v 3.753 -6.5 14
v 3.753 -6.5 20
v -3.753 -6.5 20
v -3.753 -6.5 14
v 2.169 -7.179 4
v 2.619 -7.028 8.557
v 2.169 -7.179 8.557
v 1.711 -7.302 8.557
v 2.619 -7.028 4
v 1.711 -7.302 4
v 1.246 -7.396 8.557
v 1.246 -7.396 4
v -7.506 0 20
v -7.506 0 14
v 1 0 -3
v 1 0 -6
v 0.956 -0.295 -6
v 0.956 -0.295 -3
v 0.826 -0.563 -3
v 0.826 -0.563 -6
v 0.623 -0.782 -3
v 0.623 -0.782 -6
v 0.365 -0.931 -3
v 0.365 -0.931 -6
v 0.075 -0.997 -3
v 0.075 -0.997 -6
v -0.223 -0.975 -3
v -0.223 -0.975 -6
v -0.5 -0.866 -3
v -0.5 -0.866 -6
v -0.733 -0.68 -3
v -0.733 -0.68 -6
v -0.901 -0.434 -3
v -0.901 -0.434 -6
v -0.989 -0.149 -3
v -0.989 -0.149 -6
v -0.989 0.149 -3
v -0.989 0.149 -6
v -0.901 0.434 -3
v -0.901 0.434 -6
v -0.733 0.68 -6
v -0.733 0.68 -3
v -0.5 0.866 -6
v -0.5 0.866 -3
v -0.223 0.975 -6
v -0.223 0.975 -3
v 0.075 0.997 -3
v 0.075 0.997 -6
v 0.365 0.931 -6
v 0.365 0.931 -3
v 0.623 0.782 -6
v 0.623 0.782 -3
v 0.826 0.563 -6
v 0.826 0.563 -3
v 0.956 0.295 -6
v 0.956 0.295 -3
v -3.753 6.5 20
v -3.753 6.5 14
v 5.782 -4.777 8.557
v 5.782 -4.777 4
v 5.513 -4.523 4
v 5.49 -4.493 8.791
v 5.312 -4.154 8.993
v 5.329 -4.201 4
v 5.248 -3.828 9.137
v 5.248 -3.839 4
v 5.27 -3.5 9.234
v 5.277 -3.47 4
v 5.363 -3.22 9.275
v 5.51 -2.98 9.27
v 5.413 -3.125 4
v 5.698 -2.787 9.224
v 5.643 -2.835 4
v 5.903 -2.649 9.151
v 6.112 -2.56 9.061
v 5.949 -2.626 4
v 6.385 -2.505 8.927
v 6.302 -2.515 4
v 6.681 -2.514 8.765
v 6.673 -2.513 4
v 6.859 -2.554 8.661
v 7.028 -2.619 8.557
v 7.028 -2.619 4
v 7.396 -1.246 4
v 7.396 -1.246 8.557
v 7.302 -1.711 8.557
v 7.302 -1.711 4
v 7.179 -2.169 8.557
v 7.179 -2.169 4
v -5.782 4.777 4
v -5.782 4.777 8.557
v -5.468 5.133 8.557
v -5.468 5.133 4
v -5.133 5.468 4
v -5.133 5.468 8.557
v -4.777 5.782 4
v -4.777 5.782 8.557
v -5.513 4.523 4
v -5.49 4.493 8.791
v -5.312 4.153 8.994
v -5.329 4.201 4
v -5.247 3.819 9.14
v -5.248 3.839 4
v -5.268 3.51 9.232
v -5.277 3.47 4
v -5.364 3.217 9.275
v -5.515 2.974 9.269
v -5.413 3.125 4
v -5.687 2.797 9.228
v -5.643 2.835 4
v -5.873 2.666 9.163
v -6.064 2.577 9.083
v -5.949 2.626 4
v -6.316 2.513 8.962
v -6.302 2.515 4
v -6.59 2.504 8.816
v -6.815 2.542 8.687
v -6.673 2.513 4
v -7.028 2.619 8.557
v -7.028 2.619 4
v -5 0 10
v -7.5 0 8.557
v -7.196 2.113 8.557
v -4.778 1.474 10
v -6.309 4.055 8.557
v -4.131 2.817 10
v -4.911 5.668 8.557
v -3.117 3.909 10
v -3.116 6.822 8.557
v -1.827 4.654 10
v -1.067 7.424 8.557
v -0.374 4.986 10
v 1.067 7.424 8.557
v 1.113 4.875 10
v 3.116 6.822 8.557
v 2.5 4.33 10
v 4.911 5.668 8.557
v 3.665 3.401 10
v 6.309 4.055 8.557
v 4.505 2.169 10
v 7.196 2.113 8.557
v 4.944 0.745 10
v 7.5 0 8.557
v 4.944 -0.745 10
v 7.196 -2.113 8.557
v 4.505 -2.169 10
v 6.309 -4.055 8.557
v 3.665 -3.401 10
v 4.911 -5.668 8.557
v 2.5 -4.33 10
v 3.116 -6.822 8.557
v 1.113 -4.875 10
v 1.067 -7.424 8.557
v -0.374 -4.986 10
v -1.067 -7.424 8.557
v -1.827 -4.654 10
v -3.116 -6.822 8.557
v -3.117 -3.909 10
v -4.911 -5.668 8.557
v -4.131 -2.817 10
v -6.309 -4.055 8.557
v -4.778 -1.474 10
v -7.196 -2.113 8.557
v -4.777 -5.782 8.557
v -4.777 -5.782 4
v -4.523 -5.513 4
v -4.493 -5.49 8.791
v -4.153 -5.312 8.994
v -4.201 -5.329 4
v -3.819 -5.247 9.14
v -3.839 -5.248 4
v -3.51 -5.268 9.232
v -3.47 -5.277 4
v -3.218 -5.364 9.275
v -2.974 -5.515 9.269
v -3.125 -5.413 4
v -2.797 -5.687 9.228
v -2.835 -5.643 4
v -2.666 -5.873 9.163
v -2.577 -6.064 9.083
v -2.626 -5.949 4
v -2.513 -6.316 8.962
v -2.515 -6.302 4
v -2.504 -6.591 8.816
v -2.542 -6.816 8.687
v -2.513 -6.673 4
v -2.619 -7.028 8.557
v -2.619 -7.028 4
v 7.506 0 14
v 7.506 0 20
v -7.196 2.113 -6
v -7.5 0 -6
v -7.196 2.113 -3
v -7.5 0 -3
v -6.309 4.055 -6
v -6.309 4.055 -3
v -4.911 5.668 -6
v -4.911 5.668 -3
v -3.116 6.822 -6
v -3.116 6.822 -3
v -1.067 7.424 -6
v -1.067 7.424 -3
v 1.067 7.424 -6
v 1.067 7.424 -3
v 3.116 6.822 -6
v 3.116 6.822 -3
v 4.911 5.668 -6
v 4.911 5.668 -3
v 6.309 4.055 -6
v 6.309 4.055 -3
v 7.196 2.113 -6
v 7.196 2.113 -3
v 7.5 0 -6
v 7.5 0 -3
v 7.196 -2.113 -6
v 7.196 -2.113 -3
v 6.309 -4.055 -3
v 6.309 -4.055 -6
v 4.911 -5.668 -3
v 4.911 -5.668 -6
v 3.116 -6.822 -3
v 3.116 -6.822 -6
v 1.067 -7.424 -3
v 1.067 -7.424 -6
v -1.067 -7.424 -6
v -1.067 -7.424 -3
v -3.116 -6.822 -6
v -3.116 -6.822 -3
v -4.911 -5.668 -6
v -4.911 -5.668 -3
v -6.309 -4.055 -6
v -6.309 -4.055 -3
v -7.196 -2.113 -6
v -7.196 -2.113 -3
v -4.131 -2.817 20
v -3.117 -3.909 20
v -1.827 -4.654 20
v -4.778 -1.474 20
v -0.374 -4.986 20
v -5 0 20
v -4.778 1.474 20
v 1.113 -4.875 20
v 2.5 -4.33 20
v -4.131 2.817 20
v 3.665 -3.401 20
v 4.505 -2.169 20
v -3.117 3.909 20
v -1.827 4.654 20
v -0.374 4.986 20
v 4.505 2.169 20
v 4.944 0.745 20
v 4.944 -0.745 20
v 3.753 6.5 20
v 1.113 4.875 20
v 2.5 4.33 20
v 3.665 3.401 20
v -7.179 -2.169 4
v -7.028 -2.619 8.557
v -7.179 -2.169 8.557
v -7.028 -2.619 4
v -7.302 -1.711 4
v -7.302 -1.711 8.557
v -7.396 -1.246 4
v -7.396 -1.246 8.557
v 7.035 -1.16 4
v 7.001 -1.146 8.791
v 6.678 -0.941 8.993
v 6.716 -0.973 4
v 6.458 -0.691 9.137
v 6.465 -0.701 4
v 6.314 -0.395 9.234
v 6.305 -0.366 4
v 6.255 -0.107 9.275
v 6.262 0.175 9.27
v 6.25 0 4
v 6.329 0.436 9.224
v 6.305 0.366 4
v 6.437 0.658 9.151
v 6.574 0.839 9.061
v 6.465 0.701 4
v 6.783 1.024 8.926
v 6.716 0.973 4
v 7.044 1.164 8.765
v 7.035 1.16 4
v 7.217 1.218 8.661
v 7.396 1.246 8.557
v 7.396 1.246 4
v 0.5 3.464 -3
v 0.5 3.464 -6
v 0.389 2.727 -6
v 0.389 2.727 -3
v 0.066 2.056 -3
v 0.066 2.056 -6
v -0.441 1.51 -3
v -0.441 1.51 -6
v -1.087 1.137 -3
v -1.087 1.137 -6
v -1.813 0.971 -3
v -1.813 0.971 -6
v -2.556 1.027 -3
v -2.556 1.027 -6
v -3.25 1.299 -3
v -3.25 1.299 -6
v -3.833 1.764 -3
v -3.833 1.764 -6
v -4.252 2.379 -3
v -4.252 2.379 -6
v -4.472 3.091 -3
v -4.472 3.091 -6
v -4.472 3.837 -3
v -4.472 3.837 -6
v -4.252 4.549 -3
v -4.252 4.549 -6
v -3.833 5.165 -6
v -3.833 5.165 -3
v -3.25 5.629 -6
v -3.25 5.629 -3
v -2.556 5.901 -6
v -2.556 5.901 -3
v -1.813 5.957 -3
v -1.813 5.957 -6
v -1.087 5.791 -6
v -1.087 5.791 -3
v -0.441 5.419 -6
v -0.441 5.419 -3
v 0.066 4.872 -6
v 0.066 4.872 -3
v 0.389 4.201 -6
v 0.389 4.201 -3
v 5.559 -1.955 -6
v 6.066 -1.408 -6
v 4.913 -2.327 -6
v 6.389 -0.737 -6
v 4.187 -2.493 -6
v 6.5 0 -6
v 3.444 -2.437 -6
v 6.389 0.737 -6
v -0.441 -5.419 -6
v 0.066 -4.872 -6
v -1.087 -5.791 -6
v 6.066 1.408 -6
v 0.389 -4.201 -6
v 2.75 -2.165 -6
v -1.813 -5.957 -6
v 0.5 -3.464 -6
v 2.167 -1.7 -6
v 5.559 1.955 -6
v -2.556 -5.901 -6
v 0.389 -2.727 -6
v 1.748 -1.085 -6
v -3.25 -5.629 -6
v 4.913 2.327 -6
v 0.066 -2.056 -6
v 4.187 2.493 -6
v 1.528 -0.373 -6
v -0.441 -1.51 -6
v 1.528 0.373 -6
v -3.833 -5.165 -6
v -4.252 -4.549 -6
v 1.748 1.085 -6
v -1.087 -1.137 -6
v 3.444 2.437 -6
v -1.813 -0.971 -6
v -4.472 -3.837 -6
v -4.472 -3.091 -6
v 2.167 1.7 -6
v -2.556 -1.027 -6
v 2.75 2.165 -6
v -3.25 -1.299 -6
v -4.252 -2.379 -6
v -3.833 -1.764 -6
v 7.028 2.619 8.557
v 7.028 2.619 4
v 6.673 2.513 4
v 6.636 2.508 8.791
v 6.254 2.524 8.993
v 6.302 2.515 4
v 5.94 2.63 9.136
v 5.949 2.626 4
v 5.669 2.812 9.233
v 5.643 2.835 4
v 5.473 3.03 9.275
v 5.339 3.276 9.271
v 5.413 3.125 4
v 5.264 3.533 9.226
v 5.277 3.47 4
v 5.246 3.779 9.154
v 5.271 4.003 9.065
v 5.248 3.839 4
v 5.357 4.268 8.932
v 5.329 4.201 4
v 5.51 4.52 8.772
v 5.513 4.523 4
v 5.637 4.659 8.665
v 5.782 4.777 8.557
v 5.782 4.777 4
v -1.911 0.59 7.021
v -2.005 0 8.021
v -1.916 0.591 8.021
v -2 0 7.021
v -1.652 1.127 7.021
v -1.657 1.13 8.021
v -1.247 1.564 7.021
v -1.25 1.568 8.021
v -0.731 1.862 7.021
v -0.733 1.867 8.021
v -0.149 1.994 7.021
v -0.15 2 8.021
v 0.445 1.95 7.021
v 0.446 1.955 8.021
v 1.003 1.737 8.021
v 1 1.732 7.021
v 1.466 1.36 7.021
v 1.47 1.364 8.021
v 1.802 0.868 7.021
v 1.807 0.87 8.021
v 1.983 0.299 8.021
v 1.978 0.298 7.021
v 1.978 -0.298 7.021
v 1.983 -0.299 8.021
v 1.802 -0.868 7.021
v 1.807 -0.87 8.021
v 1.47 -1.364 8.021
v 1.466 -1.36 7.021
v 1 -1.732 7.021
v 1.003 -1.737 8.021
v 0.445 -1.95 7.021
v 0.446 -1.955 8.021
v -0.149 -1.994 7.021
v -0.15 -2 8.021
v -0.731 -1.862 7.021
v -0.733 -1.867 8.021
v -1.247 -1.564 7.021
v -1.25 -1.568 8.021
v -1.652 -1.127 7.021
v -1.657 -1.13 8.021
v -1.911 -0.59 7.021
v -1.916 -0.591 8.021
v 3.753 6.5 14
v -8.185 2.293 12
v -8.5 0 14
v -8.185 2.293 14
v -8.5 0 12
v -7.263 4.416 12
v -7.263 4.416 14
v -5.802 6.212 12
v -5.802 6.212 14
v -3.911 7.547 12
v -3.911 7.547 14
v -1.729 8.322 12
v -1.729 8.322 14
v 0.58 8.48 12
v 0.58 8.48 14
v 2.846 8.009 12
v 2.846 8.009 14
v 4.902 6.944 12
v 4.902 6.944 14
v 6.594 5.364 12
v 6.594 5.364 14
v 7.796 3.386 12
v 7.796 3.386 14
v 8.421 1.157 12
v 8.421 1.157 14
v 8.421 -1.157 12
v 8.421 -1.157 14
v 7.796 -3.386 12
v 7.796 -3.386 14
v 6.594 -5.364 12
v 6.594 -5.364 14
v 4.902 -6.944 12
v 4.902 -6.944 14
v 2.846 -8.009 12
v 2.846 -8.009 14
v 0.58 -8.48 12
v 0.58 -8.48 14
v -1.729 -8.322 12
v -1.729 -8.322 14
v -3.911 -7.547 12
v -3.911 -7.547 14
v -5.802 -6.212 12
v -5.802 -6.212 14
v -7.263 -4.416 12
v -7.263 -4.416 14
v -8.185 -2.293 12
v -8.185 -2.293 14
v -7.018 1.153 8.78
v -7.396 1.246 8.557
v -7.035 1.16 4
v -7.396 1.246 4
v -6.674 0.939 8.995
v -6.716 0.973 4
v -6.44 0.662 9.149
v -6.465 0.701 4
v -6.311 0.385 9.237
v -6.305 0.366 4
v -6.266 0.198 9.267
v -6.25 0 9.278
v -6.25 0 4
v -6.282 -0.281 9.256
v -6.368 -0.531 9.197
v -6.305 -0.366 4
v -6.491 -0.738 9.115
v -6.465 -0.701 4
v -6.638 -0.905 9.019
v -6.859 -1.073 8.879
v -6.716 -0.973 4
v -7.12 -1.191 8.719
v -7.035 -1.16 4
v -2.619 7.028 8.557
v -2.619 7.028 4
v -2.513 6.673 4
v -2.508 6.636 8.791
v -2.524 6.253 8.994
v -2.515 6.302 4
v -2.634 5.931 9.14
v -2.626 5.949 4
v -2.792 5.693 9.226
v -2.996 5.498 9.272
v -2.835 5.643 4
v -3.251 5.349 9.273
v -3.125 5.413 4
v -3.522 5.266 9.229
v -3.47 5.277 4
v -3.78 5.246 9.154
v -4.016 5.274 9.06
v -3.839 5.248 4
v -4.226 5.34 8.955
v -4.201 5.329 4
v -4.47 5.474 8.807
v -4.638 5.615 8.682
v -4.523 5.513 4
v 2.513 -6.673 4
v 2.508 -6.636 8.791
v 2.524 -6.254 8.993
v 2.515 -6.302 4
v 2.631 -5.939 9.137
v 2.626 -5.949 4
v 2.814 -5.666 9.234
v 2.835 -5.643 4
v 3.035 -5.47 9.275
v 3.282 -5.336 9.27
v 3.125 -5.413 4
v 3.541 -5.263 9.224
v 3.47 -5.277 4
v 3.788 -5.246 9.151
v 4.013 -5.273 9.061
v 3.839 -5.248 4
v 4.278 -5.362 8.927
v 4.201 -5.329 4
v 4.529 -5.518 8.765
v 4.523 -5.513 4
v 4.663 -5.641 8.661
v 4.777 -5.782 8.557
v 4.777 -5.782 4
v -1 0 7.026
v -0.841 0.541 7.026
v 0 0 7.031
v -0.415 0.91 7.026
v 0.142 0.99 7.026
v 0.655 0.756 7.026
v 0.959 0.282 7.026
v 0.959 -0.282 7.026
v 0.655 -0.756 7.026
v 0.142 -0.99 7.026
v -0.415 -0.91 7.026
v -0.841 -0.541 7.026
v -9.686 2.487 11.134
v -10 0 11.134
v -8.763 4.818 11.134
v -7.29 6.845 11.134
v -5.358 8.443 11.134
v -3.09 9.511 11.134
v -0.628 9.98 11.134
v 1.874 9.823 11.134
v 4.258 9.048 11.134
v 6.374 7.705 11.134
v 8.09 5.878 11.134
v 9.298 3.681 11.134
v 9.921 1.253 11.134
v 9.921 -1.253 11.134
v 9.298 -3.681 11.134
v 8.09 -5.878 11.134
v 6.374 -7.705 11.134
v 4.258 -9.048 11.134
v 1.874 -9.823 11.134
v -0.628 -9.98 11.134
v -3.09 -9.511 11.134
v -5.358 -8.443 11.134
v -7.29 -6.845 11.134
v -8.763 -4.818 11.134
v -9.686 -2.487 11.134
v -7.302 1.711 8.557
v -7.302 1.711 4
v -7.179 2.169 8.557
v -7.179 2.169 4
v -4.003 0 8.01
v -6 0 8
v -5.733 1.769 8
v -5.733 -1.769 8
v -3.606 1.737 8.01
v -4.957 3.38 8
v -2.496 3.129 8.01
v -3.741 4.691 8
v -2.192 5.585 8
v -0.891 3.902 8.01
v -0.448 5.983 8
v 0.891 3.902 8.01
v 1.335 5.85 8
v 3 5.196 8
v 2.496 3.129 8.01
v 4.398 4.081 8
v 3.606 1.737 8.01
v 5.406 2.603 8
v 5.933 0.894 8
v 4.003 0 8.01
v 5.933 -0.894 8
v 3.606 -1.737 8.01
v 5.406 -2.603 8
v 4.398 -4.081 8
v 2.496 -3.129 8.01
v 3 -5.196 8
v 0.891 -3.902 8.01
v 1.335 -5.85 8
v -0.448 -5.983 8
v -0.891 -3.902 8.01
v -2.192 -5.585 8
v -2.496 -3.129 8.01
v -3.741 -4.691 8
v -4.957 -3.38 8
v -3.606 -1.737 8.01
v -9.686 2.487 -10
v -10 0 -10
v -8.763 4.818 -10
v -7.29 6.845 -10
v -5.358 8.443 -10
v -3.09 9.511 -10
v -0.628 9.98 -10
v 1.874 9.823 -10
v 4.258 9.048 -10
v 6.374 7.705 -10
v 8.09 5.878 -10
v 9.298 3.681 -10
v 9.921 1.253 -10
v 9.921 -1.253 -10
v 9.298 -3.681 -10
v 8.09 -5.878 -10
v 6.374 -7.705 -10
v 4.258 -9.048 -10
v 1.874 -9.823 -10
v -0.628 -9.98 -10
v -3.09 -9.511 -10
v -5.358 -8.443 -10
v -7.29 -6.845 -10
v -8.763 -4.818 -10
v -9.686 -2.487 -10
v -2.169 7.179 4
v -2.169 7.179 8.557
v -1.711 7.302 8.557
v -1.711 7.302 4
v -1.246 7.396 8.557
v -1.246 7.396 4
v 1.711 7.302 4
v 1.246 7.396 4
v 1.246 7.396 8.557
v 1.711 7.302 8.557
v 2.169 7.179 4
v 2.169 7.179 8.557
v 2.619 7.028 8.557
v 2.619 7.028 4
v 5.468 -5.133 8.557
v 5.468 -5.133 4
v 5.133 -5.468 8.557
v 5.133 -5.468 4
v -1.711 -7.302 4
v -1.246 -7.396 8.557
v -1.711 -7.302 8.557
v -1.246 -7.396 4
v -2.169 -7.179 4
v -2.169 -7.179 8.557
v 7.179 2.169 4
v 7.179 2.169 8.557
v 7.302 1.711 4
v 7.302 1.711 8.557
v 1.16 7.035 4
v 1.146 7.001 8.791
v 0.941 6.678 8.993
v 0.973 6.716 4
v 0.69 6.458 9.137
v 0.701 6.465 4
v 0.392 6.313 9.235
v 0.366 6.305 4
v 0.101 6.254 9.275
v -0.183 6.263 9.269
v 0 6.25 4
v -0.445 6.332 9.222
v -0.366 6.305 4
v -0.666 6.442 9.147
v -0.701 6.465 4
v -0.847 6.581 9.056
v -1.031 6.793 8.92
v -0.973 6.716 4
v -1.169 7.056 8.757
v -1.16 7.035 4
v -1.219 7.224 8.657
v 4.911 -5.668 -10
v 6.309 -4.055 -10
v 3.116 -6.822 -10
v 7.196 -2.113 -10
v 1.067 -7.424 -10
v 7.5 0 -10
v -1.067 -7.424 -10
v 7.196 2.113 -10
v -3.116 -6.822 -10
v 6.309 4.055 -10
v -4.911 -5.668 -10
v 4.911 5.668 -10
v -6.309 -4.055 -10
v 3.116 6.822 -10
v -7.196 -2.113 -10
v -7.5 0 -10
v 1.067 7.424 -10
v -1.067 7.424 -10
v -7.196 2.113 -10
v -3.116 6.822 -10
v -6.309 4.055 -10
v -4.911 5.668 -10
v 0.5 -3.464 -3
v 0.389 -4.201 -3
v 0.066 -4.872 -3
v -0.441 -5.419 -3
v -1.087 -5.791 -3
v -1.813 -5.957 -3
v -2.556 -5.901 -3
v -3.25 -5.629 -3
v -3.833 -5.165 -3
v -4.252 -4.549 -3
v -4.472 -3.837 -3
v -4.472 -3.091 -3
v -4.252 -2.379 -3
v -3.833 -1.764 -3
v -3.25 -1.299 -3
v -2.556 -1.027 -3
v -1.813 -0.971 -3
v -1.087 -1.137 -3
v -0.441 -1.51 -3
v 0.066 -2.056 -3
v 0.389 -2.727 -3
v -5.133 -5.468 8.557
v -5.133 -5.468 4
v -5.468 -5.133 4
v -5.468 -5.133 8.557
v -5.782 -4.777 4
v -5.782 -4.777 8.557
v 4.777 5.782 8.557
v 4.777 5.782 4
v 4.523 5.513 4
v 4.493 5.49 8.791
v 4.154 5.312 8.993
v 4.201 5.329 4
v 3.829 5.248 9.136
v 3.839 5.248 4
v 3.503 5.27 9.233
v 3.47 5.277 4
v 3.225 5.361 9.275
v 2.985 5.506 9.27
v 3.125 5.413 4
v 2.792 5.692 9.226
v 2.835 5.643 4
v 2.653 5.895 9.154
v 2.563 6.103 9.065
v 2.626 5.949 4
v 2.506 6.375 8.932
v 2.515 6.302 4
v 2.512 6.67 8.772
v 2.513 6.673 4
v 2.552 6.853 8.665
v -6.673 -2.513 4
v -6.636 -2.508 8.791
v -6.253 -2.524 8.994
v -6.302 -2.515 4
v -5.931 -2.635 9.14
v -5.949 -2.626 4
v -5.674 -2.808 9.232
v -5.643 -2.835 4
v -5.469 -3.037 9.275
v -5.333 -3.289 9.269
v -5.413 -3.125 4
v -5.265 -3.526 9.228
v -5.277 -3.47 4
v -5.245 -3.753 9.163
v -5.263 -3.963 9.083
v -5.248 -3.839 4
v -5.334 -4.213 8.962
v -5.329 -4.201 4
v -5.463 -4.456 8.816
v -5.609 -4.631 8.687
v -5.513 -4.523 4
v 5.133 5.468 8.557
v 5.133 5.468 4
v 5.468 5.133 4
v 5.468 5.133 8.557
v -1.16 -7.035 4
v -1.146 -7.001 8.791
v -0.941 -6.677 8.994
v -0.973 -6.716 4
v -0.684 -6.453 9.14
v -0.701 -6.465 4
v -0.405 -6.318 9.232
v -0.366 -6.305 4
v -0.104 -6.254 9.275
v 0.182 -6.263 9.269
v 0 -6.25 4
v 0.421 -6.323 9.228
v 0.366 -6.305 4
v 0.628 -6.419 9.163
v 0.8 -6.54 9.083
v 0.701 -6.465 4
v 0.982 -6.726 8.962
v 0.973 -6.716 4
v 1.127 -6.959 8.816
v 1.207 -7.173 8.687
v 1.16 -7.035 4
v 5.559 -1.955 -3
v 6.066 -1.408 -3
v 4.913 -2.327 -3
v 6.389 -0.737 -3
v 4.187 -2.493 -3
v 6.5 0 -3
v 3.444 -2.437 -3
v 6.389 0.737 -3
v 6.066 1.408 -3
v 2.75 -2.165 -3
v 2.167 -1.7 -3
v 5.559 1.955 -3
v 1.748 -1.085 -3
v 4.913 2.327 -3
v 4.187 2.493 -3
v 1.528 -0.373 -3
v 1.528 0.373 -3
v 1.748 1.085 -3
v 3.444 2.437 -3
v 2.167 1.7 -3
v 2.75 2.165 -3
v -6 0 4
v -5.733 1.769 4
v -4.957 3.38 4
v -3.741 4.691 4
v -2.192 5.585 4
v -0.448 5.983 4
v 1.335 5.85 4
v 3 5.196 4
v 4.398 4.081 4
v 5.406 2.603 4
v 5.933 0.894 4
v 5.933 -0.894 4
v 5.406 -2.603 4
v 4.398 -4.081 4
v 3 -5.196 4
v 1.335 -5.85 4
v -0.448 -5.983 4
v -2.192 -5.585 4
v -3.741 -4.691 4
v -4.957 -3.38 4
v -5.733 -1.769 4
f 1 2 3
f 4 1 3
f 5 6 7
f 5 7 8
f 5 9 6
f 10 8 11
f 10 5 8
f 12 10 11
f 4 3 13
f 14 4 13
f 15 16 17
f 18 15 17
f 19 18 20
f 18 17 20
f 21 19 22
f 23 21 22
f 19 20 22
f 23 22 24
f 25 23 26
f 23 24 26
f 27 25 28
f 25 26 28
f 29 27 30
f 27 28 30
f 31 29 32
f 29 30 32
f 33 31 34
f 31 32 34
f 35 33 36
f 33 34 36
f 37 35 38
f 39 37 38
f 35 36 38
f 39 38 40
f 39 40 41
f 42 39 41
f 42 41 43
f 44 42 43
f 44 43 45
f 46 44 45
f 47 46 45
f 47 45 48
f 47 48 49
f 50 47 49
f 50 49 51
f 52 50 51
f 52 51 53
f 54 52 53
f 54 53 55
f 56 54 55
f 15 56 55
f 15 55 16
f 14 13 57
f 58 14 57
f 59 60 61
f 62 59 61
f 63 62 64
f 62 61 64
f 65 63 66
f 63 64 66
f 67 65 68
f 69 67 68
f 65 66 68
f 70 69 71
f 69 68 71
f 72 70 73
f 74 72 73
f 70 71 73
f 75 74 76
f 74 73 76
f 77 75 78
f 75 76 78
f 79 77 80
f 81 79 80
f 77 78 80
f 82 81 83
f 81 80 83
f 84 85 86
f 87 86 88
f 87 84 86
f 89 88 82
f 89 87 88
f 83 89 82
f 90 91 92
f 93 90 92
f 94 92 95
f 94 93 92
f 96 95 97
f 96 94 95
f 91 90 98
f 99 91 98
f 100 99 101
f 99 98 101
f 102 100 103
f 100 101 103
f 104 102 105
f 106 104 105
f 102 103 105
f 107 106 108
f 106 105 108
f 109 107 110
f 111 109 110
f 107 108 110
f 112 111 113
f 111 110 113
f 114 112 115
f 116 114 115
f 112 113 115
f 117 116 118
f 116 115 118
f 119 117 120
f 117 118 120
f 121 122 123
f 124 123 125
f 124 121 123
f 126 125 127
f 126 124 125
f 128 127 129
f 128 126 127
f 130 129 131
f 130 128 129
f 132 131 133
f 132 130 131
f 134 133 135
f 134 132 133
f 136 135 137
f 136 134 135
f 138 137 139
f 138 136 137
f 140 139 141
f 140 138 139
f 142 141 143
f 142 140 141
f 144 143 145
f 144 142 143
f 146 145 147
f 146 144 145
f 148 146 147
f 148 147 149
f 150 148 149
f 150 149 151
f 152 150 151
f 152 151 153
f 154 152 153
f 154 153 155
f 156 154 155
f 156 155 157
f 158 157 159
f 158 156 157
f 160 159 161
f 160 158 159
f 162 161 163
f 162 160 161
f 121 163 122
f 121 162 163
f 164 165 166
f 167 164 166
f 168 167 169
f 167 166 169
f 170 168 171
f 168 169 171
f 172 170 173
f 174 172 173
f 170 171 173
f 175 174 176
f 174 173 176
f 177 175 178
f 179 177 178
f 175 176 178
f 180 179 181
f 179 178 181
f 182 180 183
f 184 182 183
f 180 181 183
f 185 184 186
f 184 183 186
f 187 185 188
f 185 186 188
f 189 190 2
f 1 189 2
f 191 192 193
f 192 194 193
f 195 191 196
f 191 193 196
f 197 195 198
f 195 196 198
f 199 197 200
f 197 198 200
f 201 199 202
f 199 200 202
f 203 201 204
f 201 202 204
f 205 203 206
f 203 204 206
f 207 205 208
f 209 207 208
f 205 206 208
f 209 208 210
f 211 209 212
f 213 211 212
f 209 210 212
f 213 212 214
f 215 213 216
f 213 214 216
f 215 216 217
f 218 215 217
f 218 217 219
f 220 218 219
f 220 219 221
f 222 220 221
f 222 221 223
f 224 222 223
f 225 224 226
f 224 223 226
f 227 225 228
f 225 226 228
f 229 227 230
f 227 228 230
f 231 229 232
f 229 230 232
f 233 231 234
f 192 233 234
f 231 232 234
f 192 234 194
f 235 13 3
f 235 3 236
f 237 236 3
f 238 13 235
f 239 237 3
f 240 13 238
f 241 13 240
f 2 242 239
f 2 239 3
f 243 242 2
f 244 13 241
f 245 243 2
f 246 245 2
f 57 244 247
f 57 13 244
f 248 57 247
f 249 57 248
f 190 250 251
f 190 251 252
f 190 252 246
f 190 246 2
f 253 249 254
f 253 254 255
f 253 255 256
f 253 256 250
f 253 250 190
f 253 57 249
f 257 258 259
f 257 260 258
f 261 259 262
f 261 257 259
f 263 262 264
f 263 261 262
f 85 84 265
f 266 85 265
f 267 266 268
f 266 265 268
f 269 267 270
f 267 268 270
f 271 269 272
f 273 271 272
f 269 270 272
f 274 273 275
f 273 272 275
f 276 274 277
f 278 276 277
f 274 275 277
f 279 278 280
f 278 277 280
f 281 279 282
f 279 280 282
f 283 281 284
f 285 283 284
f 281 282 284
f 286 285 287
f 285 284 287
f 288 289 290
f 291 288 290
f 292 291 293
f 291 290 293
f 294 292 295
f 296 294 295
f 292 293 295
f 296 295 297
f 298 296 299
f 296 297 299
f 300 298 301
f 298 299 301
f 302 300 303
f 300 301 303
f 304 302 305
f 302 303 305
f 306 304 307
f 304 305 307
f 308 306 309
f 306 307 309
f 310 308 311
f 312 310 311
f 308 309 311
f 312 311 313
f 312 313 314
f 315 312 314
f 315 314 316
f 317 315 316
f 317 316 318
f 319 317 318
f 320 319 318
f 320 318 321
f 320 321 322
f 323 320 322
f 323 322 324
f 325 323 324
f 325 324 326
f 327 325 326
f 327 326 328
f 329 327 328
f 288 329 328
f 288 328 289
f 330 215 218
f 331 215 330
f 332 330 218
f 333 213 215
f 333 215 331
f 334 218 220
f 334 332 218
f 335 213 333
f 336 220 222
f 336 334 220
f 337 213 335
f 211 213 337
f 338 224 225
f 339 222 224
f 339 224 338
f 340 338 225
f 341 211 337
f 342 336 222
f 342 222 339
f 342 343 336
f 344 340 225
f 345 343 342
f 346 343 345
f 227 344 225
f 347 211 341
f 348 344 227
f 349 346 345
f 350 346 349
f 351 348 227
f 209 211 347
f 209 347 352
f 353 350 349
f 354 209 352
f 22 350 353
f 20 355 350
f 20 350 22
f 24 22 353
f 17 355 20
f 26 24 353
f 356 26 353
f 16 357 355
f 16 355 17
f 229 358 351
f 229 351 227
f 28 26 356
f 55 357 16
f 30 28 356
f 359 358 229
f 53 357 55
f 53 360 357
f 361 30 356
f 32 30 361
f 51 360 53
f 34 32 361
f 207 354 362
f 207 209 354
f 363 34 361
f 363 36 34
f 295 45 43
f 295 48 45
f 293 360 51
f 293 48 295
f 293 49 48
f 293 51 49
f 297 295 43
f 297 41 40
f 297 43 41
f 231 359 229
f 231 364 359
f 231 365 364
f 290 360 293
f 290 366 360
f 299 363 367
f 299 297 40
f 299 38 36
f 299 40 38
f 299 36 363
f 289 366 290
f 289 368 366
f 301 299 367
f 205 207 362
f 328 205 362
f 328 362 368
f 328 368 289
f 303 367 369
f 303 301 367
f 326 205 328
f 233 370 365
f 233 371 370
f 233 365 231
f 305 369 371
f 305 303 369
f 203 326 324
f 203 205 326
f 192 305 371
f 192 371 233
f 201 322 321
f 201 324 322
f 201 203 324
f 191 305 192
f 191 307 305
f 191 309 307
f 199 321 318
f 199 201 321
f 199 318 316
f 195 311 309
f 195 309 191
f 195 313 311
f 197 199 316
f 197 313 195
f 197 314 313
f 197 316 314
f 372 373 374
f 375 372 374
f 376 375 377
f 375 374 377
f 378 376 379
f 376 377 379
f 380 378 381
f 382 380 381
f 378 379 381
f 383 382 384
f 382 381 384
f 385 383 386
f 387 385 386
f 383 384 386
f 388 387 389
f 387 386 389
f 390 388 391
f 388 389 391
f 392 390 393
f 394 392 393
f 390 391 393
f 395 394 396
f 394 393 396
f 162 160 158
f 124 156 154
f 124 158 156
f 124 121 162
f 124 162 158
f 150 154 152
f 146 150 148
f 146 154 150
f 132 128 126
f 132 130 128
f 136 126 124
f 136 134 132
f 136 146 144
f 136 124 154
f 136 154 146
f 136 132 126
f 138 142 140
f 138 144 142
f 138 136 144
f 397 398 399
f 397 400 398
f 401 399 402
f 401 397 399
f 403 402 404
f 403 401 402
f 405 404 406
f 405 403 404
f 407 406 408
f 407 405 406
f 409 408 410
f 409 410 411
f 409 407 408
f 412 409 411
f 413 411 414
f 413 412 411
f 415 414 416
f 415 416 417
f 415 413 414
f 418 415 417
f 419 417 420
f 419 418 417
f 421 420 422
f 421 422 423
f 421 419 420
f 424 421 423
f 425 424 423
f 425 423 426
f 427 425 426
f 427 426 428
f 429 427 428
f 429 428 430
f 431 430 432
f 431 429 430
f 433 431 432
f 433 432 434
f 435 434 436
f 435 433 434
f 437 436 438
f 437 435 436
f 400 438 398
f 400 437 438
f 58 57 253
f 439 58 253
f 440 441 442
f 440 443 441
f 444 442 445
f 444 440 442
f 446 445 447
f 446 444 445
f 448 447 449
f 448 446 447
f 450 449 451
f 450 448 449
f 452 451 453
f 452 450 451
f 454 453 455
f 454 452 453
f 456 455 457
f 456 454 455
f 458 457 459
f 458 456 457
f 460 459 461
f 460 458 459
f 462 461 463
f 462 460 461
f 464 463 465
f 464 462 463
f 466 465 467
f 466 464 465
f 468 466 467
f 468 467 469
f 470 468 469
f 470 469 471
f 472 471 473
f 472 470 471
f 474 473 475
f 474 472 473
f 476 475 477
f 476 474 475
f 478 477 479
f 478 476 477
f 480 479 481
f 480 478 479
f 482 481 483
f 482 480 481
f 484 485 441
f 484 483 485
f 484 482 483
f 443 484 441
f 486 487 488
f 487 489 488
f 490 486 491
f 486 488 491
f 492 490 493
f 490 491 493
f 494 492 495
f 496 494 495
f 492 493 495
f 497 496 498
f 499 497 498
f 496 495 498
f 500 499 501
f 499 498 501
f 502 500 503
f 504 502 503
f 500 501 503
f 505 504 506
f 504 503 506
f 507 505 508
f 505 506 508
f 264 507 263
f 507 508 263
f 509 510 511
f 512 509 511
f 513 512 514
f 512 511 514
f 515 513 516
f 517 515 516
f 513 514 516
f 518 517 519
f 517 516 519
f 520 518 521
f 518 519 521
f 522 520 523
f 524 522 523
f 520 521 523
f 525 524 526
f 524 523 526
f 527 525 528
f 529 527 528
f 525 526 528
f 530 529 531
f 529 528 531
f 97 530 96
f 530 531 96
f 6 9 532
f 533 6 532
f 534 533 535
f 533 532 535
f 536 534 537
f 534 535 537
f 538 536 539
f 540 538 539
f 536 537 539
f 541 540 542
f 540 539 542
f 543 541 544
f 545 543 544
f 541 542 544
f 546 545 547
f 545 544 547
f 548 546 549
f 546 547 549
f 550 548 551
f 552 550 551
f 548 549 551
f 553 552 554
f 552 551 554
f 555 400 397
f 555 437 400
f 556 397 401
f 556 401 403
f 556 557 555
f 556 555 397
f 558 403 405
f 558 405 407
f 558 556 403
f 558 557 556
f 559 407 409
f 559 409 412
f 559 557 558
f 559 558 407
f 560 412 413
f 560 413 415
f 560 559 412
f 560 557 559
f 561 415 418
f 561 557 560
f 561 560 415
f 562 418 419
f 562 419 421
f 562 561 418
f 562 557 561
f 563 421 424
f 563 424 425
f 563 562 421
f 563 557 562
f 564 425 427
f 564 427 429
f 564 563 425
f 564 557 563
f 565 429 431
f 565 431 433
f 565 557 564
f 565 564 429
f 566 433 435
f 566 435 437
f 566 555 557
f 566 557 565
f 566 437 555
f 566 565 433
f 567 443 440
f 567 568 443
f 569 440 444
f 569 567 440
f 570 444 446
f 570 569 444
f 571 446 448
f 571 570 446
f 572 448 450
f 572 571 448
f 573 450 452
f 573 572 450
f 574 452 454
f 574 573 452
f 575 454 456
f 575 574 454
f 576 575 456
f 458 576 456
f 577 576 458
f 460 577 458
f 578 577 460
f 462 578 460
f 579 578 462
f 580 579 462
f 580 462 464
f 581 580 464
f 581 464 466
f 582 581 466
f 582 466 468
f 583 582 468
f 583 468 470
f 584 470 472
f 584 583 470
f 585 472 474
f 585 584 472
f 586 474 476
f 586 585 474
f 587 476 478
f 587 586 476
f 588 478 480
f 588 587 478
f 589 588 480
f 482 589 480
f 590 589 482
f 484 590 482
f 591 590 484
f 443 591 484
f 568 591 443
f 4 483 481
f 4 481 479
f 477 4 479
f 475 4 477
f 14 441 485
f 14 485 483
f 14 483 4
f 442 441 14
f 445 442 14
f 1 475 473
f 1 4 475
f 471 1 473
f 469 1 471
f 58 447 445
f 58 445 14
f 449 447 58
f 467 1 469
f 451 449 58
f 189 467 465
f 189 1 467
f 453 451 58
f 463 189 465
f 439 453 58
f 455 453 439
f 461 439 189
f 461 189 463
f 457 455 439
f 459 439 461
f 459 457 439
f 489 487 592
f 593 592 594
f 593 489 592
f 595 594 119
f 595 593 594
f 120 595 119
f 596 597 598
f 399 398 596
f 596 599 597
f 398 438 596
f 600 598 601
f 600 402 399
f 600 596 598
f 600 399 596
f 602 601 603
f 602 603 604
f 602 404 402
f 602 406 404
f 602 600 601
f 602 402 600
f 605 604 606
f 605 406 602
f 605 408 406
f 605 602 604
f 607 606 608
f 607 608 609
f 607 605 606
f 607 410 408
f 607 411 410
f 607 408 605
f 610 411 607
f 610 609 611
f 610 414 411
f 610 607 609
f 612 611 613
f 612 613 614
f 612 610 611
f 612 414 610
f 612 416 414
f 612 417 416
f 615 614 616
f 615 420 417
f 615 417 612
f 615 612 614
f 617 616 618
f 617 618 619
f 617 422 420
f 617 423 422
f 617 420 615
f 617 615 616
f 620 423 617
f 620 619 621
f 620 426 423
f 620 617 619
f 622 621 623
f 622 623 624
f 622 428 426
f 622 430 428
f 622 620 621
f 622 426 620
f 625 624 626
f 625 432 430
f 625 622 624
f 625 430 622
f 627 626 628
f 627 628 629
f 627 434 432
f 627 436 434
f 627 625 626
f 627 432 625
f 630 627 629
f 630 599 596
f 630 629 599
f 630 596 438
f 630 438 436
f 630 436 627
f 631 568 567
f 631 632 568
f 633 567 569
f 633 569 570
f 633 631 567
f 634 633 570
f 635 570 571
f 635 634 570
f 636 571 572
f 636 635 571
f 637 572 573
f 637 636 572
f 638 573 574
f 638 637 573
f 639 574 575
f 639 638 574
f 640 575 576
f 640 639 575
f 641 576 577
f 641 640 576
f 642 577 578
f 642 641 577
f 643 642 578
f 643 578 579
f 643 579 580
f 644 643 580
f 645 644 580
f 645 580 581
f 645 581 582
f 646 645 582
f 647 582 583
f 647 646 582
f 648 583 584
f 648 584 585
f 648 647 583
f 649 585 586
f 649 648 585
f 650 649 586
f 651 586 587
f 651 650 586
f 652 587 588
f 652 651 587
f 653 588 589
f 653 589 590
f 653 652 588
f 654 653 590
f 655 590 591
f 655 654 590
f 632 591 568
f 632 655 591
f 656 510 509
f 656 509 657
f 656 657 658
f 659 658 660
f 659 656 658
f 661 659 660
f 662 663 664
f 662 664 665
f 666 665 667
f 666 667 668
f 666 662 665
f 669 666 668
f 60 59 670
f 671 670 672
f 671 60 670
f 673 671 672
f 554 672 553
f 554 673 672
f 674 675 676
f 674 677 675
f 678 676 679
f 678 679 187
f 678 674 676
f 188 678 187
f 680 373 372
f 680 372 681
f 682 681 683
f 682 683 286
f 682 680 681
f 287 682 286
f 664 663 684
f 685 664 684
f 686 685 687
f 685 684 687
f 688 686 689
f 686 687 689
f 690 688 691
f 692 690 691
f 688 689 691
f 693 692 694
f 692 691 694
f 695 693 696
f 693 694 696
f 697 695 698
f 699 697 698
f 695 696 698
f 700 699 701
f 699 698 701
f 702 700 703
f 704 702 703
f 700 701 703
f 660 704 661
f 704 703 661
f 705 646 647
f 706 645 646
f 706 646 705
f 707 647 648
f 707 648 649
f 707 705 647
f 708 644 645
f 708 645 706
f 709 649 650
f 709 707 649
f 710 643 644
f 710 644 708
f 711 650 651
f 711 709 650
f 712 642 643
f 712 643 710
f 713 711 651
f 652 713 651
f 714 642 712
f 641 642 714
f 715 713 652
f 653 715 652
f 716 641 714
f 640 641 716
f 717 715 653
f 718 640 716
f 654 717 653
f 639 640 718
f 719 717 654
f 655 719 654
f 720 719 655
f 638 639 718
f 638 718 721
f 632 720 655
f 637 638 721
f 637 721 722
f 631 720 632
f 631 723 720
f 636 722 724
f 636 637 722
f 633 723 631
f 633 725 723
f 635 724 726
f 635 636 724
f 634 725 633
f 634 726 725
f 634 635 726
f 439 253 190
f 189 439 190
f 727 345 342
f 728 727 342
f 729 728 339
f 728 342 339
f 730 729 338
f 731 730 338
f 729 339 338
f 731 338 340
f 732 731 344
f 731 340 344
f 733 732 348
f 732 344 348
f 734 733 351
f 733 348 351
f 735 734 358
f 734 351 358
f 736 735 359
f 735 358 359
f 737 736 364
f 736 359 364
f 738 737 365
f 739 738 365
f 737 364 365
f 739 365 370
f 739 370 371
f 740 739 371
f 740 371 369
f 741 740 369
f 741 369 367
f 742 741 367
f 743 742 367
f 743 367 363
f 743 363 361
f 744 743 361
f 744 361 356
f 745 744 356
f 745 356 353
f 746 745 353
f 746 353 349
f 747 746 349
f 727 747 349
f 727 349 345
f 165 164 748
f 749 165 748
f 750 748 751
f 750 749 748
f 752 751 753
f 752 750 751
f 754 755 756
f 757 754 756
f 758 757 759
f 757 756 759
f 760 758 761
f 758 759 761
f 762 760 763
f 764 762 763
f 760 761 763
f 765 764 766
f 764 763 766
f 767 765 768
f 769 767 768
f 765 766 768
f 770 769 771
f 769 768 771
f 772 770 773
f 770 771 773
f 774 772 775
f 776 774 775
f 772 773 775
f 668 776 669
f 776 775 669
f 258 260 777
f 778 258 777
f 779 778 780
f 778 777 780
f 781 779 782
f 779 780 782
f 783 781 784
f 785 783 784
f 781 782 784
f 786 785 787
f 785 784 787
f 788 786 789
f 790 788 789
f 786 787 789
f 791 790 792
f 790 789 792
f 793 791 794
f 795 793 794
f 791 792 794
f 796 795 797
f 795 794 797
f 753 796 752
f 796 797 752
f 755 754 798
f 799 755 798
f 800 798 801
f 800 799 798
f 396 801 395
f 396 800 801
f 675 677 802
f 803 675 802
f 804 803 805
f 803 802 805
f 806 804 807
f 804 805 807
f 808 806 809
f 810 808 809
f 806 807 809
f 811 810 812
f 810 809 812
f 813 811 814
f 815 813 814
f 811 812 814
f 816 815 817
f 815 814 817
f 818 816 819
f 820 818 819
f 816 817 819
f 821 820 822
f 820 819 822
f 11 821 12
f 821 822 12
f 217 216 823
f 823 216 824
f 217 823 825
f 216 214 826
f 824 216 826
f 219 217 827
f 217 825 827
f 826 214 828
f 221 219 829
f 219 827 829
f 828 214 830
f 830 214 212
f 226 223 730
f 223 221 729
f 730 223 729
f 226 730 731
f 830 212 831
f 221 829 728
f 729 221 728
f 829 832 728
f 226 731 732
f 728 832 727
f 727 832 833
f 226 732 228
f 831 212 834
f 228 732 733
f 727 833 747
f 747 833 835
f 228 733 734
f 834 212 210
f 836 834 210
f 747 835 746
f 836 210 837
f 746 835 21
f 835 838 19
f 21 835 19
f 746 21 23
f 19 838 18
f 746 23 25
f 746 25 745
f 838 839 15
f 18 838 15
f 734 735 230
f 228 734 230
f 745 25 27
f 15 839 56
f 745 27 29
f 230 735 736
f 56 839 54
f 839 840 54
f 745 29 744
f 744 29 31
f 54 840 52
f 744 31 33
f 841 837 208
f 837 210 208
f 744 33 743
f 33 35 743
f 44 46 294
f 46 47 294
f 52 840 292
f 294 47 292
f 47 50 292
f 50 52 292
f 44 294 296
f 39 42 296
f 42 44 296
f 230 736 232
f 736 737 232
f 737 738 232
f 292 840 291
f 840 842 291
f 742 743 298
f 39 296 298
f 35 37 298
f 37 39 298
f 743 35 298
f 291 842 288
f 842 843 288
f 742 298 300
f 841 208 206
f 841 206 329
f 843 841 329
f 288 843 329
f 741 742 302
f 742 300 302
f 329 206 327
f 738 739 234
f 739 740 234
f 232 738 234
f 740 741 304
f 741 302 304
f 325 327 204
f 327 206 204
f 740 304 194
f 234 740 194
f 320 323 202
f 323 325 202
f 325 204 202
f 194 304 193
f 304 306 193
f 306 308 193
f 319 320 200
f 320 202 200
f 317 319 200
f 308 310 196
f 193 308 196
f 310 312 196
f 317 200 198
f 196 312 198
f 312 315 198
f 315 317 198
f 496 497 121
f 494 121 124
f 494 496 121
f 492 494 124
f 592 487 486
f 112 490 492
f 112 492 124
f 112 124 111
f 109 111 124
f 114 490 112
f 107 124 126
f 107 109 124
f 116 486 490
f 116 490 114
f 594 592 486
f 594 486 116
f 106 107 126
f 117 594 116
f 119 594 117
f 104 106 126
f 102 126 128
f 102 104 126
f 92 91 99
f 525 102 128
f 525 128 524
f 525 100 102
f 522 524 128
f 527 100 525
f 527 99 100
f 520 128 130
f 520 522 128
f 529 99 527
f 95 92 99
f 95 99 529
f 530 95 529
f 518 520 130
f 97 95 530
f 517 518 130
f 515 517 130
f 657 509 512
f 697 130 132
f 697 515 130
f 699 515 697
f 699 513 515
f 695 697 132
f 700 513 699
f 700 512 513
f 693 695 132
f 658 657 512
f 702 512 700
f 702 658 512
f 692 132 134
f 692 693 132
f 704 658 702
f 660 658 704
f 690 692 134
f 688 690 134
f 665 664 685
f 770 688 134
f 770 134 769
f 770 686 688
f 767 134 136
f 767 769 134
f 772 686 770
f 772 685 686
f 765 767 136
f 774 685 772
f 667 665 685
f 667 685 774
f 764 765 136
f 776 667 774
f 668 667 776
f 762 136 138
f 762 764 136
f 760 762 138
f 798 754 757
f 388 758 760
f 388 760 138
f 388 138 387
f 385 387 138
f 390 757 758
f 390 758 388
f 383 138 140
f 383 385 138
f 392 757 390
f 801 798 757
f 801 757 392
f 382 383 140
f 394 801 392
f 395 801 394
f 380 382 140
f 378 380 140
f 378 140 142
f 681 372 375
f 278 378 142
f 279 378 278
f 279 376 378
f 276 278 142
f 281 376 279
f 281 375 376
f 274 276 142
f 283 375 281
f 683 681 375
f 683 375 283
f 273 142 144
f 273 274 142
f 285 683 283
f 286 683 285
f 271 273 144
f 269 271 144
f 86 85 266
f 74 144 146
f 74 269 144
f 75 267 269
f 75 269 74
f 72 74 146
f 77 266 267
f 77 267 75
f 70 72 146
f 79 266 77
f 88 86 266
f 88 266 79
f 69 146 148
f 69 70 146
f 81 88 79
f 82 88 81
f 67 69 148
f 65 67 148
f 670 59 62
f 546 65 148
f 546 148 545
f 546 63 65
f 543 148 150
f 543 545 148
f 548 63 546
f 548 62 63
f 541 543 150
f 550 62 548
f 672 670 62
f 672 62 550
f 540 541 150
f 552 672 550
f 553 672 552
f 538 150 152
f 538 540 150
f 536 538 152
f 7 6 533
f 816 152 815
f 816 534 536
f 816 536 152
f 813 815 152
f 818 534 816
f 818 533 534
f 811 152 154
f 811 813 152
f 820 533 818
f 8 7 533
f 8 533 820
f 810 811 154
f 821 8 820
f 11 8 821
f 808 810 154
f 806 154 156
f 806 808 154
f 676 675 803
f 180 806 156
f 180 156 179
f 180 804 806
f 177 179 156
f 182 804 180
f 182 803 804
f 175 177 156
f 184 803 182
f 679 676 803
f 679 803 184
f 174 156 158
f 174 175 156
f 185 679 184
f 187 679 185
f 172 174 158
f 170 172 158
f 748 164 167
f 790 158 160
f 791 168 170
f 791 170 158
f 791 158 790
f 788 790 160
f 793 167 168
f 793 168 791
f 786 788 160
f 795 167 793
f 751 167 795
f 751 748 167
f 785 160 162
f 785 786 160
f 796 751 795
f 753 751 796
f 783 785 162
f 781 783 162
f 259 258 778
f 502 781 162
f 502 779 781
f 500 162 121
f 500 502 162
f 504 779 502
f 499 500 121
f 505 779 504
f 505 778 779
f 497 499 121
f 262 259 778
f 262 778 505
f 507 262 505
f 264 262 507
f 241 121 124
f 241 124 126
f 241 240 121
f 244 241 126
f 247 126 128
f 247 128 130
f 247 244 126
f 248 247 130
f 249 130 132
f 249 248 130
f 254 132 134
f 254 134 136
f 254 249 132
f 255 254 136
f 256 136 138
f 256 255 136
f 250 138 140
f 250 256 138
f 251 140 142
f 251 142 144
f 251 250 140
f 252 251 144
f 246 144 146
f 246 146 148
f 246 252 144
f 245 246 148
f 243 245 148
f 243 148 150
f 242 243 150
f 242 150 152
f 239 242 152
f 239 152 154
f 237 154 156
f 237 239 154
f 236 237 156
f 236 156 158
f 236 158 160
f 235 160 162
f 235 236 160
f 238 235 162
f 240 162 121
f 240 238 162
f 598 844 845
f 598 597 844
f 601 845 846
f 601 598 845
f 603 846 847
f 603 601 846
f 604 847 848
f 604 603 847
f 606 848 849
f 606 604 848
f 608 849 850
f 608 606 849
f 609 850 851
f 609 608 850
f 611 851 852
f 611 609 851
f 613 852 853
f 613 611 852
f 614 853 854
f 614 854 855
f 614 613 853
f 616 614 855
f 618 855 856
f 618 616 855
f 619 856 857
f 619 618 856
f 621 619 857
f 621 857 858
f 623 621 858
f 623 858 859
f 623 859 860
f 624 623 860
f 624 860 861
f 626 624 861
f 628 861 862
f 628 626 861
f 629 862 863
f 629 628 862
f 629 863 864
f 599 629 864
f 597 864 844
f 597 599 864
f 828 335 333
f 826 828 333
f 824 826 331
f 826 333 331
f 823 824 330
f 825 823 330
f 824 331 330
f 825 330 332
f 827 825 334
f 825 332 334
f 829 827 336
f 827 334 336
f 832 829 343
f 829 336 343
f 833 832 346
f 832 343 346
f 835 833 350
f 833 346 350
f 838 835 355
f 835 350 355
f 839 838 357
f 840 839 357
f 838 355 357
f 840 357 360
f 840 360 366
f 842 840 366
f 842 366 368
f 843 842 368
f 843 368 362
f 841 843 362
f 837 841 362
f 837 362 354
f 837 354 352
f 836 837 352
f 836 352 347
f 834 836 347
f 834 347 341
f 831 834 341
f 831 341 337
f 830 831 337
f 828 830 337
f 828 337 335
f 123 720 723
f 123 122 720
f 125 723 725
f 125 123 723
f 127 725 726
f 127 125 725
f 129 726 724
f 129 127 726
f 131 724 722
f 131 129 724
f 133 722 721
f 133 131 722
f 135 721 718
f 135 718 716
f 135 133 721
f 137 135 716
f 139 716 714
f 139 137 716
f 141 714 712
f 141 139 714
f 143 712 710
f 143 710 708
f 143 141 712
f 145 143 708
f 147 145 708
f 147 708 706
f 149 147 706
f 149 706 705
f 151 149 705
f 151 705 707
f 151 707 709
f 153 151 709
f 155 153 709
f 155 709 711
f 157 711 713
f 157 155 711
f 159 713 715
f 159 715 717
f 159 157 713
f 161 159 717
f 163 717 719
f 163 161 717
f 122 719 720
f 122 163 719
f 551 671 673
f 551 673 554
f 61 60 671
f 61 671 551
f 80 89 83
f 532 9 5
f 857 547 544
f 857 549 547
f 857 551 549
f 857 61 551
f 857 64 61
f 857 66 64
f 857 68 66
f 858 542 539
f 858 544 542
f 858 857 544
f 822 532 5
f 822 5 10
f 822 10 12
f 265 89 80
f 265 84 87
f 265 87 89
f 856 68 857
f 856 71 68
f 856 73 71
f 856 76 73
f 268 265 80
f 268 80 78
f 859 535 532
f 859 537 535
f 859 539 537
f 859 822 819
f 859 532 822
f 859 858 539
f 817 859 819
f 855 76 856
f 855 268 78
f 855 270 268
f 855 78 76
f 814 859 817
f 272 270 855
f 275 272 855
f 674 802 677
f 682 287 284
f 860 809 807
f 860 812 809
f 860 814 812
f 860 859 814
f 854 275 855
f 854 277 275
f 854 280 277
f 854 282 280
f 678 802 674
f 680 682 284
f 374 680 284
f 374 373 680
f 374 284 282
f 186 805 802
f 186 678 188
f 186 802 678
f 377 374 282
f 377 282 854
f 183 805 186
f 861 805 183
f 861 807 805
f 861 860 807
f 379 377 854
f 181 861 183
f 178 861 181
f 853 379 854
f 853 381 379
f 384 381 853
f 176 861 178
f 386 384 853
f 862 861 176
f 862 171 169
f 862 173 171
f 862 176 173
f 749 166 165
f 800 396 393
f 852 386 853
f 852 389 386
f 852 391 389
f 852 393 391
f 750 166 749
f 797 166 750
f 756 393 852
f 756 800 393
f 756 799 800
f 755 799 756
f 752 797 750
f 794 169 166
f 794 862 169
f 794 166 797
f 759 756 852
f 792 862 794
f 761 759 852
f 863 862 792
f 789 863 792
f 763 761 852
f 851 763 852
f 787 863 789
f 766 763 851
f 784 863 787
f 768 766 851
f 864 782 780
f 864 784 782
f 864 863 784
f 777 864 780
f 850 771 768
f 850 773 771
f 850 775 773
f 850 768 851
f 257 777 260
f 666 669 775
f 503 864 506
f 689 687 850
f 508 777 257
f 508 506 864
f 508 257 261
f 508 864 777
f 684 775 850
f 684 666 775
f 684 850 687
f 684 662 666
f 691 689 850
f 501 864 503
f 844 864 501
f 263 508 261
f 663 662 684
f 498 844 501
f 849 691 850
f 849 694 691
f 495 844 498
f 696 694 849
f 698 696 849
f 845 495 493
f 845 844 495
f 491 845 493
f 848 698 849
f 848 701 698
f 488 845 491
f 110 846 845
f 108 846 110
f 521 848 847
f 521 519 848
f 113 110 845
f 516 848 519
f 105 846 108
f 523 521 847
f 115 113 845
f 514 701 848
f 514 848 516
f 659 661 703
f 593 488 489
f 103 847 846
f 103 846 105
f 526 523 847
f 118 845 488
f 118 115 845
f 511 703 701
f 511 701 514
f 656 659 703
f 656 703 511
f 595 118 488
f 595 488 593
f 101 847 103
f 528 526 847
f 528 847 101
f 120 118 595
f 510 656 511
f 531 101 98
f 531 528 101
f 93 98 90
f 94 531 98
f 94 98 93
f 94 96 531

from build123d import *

# Parameters (mm, degrees)
F0_W     = 7.5
F0_H     = 3
F4_R     = 2.5
F4_R_2   = 1
F5_DEPTH = 26.001
F6_R     = 1.25
F7_DEPTH = 8
F8_R     = 8.5
F9_DEPTH = 6


with BuildPart() as f1:
    # F0 (on Front) → F1 (revolve)
    with BuildSketch(Plane.XZ):
        Polygon((-5, 10), (-5, 20), (-8.5, 20), (-8.5, 12), (-10, 11.1339745962), (-10, -10), (-7.5, -10), (-7.5, -6), (-7.5, -3), (-7.5, 4), (-7.5, 8.556624327), align=None)
    revolve(axis=Axis((0, 0, 5.3995972465), (0, 0, -1)))

    # F8 (on face) → F9 (cut)
    with BuildSketch(Plane.XY.offset(20)):
        Circle(F8_R)
        Polygon((-3.7527767497, -6.5), (-7.5055534995, 0), (-3.7527767497, 6.5), (3.7527767497, 6.5), (7.5055534995, 0), (3.7527767497, -6.5), align=None, mode=Mode.SUBTRACT)
    extrude(amount=-F9_DEPTH, mode=Mode.SUBTRACT)


with BuildPart() as f2:
    # F0 (on Front) → F2 (revolve)
    with BuildSketch(Plane.XZ):
        Polygon((0, 10), (-5, 10), (-7.5, 8.556624327), (-7.5, 4), (-6, 4), (-6, 8), (-2.0052228626, 8.0208644567), (-2, 7.0208780959), (0, 7.0313239636), (0, 8.031337603), align=None)
    revolve(axis=Axis((0, 0, 5.3995972465), (0, 0, -1)))

    # F6 (on face) → F7 (cut)
    with BuildSketch(Plane(origin=(0, 0, 4), x_dir=(1, 0, 0), z_dir=(0, 0, -1))):
        with Locations((0, 7.5)):
            Circle(F6_R)
        with Locations((-3.75, 6.4951905284)):
            Circle(F6_R)
        with Locations((-6.4951905284, 3.75)):
            Circle(F6_R)
        with Locations((-7.5, 0)):
            Circle(F6_R)
        with Locations((-6.4951905284, -3.75)):
            Circle(F6_R)
        with Locations((-3.75, -6.4951905284)):
            Circle(F6_R)
        with Locations((0, -7.5)):
            Circle(F6_R)
        with Locations((3.75, -6.4951905284)):
            Circle(F6_R)
        with Locations((6.4951905284, -3.75)):
            Circle(F6_R)
        with Locations((7.5, 0)):
            Circle(F6_R)
        with Locations((6.4951905284, 3.75)):
            Circle(F6_R)
        with Locations((3.75, 6.4951905284)):
            Circle(F6_R)
    extrude(amount=-F7_DEPTH, mode=Mode.SUBTRACT)


with BuildPart() as f3:
    # F0 (on Front) → F3 (revolve)
    with BuildSketch(Plane.XZ):
        with Locations((-3.75, -4.5)):
            Rectangle(F0_W, F0_H)
    revolve(axis=Axis((0, 0, 5.3995972465), (0, 0, -1)))

    # F4 (on face) → F5 (cut, through all)
    with BuildSketch(Plane(origin=(0, 0, -6), x_dir=(1, 0, 0), z_dir=(0, 0, -1))):
        with Locations((4, 0)):
            Circle(F4_R)
        with Locations((-2, 3.4641016151)):
            Circle(F4_R)
        with Locations((-2, -3.4641016151)):
            Circle(F4_R)
        Circle(F4_R_2)
    extrude(amount=-F5_DEPTH, mode=Mode.SUBTRACT)


solid = Compound([f1.part, f2.part, f3.part])
